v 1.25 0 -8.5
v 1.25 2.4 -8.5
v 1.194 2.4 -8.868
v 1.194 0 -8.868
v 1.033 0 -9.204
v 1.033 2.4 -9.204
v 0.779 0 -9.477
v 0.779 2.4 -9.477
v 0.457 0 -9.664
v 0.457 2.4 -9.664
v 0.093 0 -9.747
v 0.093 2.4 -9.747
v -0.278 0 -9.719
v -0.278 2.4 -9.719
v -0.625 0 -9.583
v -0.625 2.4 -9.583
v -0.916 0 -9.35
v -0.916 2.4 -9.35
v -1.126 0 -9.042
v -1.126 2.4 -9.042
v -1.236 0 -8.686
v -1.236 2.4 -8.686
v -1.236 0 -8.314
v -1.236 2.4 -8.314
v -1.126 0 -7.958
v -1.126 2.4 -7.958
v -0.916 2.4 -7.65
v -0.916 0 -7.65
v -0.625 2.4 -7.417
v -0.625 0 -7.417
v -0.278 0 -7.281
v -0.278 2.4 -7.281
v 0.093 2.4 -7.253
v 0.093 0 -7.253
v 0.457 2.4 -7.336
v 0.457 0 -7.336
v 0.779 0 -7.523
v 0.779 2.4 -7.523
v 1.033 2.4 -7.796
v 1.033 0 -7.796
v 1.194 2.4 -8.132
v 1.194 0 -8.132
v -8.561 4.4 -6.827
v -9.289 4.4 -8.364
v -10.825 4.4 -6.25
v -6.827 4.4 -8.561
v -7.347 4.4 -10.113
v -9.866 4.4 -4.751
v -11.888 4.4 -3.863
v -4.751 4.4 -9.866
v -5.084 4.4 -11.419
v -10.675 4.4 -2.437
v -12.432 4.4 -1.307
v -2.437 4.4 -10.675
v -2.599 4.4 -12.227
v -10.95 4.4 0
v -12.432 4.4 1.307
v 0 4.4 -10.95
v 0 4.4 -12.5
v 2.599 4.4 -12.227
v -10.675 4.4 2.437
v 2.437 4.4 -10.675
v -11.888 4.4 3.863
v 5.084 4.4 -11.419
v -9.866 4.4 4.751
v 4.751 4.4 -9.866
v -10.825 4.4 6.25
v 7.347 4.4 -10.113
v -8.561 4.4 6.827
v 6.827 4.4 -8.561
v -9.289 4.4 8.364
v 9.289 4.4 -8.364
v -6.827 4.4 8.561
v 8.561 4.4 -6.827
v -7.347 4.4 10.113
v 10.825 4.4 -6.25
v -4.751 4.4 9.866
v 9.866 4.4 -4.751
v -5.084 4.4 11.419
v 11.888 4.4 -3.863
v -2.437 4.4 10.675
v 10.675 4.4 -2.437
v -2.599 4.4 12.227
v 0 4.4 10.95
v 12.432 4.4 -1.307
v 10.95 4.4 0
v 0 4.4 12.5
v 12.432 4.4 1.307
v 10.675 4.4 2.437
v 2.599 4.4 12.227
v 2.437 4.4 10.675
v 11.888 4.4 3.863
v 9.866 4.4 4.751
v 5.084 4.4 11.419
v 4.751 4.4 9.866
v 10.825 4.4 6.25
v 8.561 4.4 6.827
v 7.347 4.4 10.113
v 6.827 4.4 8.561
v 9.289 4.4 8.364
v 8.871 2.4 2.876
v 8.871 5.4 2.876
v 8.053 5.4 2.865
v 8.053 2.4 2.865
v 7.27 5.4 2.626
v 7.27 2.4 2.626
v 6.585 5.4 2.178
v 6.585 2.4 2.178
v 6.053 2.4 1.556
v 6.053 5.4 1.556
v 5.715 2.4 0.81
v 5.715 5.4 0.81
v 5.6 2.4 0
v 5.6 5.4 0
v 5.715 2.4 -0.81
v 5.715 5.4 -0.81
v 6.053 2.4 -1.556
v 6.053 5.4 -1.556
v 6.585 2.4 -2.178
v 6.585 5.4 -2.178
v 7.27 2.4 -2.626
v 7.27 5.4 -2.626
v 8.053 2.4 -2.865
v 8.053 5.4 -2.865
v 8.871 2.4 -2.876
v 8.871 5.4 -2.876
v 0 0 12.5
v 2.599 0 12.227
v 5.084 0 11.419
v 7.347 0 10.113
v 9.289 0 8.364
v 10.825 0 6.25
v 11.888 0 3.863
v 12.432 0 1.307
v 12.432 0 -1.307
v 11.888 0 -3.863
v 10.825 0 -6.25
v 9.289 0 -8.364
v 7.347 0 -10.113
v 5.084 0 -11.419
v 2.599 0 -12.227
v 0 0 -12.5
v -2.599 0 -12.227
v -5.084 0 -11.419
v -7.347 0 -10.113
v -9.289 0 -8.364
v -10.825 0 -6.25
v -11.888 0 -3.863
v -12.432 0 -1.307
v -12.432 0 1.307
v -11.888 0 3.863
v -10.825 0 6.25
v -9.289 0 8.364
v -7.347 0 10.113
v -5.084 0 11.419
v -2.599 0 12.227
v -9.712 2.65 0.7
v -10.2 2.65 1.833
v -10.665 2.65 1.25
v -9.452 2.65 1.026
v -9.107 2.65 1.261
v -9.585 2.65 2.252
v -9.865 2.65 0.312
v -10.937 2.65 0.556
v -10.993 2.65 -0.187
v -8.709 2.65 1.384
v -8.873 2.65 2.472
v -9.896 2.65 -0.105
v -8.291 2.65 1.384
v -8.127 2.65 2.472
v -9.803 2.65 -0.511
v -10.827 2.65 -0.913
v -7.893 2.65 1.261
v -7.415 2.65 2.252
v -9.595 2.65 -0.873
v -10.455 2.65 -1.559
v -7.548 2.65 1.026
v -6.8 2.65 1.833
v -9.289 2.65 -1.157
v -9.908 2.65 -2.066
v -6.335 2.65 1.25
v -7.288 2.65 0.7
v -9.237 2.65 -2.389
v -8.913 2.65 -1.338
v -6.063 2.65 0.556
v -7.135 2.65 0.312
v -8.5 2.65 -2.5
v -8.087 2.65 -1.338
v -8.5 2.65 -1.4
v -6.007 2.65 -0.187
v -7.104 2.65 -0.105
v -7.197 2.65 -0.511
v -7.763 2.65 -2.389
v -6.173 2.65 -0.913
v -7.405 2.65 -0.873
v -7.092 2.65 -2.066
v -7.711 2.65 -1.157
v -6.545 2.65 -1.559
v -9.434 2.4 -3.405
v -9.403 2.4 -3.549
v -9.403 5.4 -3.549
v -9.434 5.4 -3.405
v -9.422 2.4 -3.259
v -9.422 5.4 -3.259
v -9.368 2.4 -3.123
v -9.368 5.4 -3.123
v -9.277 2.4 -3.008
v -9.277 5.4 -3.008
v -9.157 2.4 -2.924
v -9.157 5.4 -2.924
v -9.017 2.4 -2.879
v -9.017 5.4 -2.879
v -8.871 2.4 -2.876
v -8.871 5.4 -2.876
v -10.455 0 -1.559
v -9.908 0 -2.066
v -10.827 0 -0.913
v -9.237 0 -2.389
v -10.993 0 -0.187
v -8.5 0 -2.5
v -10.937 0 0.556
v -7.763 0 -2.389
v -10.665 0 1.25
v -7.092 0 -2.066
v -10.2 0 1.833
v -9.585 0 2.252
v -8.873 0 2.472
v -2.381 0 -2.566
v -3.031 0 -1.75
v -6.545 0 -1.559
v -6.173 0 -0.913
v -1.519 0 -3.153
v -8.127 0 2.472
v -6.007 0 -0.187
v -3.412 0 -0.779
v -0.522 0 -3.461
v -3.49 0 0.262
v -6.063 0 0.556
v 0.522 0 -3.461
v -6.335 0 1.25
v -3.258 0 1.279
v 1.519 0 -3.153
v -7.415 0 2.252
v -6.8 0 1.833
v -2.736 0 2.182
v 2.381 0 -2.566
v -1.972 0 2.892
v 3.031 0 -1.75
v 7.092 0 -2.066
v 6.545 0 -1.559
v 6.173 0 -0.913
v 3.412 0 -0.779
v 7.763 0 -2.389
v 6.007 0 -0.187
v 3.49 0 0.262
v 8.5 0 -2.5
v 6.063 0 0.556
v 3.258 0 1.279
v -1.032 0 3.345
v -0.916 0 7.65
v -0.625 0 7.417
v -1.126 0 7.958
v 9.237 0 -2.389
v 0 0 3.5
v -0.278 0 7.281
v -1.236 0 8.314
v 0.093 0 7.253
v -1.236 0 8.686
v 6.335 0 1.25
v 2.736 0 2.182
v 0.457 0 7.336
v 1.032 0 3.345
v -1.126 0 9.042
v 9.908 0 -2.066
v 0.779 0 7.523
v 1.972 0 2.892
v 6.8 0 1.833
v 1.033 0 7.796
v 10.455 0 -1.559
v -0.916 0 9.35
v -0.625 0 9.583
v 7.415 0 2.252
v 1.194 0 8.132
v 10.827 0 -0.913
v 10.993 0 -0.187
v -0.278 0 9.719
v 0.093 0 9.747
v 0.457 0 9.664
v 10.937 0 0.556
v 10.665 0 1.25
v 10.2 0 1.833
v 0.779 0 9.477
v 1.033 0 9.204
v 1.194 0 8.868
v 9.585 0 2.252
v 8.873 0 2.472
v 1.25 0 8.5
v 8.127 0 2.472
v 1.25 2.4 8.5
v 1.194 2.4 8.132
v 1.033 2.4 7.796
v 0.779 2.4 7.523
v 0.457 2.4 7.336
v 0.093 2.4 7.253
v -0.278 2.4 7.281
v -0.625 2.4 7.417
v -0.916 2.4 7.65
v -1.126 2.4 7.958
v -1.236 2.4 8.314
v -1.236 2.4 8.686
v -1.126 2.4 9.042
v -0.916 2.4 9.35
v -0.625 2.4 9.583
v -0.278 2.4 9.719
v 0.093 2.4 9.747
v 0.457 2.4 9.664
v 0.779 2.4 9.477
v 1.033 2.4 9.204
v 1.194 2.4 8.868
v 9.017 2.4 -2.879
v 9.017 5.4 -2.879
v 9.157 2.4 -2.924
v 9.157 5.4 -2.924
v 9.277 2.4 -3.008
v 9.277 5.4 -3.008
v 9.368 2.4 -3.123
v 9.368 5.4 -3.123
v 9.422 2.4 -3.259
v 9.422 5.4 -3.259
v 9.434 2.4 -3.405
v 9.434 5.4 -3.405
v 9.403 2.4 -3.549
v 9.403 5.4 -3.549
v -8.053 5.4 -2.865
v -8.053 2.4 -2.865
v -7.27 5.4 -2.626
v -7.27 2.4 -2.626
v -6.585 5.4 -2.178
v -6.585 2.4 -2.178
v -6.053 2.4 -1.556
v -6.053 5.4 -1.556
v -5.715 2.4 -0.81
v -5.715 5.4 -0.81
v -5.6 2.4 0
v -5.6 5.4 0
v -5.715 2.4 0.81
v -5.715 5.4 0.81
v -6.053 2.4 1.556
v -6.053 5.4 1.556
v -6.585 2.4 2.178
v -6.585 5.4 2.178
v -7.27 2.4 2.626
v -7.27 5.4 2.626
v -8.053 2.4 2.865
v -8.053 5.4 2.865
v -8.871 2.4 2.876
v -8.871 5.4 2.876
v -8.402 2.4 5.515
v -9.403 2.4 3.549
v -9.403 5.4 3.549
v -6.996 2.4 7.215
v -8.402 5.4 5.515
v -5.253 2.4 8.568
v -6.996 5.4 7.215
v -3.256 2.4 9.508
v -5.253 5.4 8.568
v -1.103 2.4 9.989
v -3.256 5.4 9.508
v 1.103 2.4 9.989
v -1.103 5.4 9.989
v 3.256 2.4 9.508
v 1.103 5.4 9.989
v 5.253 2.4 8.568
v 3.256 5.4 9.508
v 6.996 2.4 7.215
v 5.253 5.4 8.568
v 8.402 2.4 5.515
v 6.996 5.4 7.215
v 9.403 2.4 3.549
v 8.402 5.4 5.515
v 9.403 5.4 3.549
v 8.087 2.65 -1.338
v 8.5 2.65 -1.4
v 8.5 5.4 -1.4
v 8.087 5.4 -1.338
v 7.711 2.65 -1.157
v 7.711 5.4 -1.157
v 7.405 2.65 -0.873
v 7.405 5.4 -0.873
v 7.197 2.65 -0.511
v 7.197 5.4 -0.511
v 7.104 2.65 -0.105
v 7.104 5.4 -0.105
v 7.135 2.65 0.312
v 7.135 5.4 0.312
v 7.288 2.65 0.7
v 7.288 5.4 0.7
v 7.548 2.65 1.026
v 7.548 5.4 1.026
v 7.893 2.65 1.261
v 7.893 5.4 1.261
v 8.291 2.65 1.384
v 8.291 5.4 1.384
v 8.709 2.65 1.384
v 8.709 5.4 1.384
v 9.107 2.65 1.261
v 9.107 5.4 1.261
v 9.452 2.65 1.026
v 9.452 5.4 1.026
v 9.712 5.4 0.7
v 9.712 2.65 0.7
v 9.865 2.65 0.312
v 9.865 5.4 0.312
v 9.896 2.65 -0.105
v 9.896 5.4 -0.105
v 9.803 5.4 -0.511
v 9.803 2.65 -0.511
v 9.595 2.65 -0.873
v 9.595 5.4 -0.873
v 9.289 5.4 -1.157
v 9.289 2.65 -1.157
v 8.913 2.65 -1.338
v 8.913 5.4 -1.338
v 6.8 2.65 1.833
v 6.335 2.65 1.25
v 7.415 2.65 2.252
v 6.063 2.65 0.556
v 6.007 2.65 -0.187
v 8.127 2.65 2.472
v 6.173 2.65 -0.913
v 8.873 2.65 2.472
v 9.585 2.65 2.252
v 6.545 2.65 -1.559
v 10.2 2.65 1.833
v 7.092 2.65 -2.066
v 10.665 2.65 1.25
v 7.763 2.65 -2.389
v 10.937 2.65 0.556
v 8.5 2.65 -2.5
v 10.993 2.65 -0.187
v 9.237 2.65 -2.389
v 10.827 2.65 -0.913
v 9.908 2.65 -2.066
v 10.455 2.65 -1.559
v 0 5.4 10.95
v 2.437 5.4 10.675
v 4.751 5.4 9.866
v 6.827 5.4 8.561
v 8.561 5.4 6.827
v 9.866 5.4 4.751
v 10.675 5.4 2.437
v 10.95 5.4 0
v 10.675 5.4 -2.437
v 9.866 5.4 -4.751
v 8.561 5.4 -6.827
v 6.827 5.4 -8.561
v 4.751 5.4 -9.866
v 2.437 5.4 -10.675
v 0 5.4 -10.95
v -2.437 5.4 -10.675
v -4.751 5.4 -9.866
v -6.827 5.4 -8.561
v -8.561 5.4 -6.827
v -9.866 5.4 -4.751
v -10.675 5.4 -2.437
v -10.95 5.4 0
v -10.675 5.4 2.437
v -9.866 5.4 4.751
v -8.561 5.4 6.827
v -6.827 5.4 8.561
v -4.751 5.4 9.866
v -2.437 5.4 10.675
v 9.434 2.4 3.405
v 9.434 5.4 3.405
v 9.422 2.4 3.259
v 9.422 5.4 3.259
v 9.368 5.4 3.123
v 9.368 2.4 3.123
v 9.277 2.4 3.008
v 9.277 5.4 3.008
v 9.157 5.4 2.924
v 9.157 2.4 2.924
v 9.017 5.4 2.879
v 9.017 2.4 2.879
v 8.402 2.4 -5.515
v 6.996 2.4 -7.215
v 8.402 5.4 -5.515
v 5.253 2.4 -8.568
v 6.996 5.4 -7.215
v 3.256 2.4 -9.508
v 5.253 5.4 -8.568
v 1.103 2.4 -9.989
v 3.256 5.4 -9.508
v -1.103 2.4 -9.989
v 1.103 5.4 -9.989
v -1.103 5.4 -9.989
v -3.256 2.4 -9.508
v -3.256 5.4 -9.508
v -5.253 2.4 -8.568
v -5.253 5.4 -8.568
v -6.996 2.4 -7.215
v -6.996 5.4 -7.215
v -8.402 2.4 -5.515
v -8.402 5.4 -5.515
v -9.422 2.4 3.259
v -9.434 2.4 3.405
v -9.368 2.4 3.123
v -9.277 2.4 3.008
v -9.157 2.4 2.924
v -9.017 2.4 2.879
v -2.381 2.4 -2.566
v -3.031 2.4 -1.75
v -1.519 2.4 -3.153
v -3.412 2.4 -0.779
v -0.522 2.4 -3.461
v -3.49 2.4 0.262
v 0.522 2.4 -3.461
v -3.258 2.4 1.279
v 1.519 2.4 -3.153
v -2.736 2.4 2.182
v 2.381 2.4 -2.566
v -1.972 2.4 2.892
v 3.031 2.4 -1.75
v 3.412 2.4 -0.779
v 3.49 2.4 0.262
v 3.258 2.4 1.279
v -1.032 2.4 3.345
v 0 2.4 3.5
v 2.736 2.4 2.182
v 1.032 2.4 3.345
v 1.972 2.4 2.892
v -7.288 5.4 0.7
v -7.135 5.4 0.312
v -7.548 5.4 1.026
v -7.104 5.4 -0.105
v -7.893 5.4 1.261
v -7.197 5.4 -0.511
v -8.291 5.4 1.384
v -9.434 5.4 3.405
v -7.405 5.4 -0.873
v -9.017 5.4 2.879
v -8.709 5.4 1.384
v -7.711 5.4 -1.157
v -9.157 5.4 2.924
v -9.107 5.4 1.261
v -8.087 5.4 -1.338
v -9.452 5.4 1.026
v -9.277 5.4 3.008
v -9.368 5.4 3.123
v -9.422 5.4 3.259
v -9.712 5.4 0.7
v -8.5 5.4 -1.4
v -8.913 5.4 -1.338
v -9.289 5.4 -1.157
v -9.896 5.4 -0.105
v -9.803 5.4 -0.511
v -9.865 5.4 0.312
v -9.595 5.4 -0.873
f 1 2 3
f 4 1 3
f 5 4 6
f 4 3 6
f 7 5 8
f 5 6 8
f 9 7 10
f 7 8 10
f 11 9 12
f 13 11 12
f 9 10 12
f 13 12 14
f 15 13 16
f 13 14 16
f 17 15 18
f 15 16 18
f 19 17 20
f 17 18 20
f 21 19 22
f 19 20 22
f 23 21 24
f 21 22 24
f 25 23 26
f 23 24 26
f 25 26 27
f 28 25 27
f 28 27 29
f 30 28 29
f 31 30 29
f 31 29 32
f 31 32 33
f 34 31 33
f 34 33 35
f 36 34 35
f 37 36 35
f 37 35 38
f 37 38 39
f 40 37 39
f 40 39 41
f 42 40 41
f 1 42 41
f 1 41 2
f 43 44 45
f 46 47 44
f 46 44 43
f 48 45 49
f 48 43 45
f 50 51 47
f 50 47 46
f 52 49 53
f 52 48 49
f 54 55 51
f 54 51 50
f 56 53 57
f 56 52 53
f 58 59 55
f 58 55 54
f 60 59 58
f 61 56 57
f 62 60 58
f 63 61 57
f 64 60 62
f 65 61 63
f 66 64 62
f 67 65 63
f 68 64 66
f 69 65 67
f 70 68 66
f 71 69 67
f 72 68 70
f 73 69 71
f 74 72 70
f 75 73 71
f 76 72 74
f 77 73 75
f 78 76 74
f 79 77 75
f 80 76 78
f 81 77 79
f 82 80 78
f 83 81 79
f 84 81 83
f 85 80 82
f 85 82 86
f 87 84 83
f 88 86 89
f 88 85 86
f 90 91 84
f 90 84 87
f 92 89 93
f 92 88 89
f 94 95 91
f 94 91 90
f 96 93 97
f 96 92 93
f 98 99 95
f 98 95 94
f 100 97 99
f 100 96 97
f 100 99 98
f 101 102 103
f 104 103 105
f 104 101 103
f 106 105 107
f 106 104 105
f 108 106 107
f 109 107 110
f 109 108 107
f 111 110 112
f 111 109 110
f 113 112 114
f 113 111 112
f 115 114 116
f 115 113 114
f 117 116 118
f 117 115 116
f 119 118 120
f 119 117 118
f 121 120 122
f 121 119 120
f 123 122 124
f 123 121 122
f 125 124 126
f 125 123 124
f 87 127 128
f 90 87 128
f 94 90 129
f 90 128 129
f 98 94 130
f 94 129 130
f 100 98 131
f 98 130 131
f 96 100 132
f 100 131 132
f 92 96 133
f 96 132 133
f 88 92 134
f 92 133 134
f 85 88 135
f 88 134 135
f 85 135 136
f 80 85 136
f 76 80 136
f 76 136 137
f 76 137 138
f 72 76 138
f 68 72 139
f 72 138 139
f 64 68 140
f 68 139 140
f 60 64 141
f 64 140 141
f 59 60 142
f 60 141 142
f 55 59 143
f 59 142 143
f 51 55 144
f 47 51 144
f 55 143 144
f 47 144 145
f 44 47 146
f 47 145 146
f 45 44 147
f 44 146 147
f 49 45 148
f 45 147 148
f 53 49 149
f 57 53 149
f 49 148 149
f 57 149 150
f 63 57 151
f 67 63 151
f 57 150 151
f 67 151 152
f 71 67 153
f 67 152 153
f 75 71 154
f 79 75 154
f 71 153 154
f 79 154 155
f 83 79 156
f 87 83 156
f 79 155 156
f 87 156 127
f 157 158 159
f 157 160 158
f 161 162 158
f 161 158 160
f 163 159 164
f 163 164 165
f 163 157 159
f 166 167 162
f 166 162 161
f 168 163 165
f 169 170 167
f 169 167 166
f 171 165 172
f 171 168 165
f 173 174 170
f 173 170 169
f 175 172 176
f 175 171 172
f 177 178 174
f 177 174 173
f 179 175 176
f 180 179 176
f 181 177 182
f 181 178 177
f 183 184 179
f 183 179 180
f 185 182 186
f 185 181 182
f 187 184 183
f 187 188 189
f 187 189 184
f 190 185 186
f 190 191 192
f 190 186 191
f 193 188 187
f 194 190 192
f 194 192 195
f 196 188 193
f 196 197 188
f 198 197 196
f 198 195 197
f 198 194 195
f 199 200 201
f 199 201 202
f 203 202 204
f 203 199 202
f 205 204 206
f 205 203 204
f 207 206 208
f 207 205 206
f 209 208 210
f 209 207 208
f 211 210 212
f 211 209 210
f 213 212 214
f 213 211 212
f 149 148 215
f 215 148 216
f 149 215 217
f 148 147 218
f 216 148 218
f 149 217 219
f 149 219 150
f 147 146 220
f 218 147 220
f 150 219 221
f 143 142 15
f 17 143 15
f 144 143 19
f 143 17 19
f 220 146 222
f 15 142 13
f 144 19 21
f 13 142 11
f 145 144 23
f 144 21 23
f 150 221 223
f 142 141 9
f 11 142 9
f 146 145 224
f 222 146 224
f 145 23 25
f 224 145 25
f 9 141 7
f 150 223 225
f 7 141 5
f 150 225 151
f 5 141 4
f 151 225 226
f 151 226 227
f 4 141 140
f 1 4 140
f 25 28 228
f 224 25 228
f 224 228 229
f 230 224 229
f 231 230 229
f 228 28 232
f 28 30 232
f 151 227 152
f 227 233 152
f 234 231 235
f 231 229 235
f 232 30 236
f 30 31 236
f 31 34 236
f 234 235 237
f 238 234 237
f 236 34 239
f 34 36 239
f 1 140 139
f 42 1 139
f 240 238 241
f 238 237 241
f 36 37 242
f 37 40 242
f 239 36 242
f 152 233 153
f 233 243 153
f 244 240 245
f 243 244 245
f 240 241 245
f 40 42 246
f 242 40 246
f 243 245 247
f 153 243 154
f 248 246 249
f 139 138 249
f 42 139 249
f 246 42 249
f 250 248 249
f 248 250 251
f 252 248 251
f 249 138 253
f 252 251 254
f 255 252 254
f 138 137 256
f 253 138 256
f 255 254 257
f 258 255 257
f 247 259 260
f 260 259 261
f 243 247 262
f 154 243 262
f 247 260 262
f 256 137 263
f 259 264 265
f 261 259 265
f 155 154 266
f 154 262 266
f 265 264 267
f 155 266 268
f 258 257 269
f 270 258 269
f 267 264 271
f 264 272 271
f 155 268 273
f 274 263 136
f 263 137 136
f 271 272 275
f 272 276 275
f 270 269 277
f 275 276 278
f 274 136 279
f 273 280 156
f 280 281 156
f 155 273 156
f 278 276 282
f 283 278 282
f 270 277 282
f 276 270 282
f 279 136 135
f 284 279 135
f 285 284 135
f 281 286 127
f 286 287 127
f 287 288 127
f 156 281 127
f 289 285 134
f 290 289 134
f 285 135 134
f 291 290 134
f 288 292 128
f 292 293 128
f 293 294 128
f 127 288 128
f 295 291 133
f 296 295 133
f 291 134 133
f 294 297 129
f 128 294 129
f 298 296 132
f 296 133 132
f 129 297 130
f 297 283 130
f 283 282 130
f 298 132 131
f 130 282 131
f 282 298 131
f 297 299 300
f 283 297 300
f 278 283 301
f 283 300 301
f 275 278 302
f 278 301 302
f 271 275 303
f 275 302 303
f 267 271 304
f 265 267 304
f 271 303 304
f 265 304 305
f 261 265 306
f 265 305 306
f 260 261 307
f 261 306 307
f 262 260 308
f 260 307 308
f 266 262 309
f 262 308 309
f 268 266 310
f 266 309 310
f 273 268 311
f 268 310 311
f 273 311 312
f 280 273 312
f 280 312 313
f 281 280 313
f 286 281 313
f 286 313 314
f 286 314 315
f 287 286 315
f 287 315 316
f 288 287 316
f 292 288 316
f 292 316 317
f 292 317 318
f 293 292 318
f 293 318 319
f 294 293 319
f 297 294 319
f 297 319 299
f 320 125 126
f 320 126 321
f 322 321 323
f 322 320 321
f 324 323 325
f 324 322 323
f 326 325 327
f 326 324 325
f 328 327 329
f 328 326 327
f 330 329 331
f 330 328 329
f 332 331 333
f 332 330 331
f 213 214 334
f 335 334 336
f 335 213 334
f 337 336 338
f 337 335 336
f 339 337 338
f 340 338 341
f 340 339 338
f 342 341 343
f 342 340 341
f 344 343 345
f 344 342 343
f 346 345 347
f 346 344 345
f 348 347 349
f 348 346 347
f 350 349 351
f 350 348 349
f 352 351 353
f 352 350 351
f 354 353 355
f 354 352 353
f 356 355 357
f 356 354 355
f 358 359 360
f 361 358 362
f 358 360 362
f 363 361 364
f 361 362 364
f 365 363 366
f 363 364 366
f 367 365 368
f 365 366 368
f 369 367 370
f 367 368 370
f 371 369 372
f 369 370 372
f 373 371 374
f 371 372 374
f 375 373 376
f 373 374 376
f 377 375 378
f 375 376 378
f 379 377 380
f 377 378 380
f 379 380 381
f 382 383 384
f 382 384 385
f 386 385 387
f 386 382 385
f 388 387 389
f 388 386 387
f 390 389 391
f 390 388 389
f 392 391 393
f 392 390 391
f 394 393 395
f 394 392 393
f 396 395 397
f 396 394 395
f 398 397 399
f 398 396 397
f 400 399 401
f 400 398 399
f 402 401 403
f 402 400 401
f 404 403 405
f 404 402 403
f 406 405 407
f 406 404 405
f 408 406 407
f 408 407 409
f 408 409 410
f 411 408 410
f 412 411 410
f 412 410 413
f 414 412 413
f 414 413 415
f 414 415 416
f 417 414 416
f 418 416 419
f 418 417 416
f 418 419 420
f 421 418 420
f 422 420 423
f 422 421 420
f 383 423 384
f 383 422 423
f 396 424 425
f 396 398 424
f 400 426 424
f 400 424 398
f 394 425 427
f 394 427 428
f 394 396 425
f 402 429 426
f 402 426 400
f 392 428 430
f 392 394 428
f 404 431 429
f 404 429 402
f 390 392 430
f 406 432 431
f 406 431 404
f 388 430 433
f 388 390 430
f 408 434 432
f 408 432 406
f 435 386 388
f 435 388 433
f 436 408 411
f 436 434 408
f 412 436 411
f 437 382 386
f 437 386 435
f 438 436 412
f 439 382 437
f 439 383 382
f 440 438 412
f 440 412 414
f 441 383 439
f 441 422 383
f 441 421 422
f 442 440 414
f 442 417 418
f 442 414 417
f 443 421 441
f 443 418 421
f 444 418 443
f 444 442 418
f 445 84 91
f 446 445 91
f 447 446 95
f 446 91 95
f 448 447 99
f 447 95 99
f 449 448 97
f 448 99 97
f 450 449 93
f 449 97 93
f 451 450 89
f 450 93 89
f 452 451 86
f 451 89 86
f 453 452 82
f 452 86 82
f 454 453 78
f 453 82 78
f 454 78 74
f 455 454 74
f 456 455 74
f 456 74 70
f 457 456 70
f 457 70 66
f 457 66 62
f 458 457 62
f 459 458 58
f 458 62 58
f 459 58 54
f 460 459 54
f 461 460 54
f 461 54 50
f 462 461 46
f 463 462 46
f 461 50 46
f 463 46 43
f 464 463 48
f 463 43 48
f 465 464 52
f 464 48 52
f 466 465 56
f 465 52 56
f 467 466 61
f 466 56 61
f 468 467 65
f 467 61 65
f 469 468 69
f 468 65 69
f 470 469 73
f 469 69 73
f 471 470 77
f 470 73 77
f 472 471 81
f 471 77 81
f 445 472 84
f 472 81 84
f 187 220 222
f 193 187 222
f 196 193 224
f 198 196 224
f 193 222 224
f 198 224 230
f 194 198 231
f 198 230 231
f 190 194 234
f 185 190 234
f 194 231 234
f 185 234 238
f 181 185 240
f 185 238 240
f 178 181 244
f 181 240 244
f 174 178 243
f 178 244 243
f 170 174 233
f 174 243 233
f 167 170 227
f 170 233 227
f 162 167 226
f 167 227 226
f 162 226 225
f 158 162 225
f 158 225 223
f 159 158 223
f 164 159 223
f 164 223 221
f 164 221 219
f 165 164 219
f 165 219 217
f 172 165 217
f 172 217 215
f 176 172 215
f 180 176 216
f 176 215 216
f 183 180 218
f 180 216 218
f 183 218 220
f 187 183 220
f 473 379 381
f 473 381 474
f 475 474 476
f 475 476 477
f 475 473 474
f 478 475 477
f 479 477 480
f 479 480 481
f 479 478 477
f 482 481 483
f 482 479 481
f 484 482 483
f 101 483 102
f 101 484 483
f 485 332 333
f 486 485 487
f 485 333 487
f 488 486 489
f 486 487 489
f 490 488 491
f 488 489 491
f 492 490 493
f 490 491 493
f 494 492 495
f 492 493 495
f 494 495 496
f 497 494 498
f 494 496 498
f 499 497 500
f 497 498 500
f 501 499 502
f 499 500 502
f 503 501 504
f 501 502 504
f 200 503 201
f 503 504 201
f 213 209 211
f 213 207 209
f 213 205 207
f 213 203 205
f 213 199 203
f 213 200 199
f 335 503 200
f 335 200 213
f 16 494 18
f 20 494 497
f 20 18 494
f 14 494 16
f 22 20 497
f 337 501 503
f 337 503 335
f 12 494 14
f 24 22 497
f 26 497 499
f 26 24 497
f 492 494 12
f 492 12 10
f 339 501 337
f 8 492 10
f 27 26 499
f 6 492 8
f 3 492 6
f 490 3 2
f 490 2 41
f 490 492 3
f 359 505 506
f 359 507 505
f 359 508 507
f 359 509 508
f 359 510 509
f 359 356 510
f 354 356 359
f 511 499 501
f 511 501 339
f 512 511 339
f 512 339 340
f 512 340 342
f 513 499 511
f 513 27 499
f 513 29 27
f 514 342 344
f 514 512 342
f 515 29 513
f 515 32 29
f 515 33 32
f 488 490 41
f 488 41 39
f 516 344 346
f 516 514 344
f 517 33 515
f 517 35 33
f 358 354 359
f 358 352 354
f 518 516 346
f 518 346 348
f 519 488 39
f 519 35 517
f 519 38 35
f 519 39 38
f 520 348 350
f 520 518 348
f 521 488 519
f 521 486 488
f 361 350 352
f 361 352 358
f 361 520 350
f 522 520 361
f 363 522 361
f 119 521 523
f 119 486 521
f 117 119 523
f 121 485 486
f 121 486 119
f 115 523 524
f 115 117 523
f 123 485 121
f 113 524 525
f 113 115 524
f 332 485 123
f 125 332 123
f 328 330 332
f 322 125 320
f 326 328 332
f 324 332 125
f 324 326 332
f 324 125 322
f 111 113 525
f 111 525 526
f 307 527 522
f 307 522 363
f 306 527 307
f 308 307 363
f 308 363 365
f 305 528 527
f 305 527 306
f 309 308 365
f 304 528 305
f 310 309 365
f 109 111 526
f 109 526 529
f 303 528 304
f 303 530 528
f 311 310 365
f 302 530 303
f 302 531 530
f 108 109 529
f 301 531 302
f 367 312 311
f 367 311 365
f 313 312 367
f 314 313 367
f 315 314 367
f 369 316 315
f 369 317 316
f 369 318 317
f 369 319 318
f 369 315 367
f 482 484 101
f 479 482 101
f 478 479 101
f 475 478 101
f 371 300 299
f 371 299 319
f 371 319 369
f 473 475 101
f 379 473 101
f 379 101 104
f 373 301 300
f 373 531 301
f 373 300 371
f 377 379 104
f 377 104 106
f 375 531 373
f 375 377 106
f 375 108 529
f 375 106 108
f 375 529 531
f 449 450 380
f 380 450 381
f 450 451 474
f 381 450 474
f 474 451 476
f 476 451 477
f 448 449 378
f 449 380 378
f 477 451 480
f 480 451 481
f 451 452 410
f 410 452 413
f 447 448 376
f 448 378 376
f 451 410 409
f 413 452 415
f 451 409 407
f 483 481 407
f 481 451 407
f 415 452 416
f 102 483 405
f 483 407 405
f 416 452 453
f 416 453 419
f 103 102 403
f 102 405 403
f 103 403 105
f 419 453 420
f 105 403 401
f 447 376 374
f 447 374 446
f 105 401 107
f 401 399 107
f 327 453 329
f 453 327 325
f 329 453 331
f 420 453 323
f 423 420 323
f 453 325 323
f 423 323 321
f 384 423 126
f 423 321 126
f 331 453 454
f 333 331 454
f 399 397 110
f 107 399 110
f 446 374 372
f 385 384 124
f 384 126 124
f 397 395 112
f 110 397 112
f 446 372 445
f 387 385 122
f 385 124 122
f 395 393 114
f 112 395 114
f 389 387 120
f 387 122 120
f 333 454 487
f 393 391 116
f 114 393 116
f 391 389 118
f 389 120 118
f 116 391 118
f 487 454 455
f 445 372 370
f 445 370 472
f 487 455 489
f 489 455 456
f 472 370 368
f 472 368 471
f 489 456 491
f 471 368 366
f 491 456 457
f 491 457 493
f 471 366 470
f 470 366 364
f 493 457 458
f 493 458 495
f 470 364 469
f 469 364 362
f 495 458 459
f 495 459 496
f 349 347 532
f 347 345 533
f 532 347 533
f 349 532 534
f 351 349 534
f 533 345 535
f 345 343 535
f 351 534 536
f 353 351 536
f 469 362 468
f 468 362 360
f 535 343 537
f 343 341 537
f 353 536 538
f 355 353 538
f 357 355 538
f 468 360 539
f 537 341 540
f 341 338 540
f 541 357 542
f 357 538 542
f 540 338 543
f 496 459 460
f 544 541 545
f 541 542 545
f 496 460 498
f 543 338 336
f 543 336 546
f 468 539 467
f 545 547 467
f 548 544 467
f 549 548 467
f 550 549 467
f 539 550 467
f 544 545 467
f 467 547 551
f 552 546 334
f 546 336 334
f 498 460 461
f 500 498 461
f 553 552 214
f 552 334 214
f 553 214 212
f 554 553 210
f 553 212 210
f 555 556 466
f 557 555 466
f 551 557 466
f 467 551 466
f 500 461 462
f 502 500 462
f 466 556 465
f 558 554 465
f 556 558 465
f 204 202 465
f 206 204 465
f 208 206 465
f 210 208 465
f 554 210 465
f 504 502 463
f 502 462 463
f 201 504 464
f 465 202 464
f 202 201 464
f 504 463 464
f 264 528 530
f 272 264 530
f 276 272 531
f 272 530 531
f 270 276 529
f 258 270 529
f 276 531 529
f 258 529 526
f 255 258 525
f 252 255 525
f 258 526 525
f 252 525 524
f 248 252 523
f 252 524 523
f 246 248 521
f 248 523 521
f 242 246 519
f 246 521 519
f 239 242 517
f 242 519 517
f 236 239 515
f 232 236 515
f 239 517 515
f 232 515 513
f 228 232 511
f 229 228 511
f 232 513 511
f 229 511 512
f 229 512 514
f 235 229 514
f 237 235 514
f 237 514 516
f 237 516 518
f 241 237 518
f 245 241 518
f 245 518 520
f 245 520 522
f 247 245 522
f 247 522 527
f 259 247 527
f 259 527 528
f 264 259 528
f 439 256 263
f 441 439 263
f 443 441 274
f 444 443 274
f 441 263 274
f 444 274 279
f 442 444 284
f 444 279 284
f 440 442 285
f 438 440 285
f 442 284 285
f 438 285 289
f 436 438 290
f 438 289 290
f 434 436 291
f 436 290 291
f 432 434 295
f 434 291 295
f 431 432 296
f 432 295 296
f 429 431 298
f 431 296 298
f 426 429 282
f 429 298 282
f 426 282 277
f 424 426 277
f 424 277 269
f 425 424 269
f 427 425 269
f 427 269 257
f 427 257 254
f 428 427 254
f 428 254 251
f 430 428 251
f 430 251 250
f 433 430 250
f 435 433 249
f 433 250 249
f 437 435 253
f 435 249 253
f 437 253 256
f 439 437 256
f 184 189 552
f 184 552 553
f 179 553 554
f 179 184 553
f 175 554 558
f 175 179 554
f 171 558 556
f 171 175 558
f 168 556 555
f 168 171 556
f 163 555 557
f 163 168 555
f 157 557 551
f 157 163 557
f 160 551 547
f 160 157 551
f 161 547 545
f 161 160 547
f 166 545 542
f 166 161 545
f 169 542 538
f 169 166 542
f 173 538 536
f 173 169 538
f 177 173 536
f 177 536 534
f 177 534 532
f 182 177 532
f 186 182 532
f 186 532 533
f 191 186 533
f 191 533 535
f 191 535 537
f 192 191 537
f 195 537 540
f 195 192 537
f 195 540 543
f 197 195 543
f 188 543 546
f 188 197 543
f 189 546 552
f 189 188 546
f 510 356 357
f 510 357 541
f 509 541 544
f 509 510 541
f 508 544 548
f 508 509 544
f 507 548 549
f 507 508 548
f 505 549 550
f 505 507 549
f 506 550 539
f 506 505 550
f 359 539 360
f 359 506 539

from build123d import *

# Parameters (mm, degrees)
SKETCH1_R             = 12.5
BOSS_EXTRUDE1_DEPTH   = 4.4
SKETCH2_R             = 10.95
BOSS_EXTRUDE2_DEPTH   = 1
SKETCH3_R             = 10.05
CUT_EXTRUDE1_DEPTH    = 3
SKETCH4_R             = 3.5
CUT_EXTRUDE2_DEPTH    = 18.930421077
SKETCH5_R             = 1.4
CUT_EXTRUDE3_DEPTH    = 19.484047176
SKETCH6_R             = 1.4
BOSS_EXTRUDE3_DEPTH   = 3
FILLET1_R             = 0.5
SKETCH7_R             = 2.5
CUT_EXTRUDE4_DEPTH    = 2.65
M3X0_5_TAPPED_HOLE1_D = 2.5


with BuildPart() as part:
    # Sketch1 → Boss-Extrude1 (new body)
    with BuildSketch(Plane(origin=(0, 0, 0), x_dir=(1, 0, 0), z_dir=(0, 1, 0))):
        with Locations(Location((0, 0, 0), (0, 0, 270))):
            Circle(SKETCH1_R)
    extrude(amount=BOSS_EXTRUDE1_DEPTH)

    # Sketch2 → Boss-Extrude2 (add)
    with BuildSketch(Plane(origin=(0, 4.4, 0), x_dir=(1, 0, 0), z_dir=(0, 1, 0))):
        with Locations(Location((0, 0, 0), (0, 0, 270))):
            Circle(SKETCH2_R)
    extrude(amount=BOSS_EXTRUDE2_DEPTH)

    # Sketch3 → Cut-Extrude1 (cut)
    with BuildSketch(Plane(origin=(0, 5.4, 0), x_dir=(1, 0, 0), z_dir=(0, 1, 0))):
        with Locations(Location((0, 0, 0), (0, 0, 270))):
            Circle(SKETCH3_R)
    extrude(amount=-CUT_EXTRUDE1_DEPTH, mode=Mode.SUBTRACT)

    # Sketch4 → Cut-Extrude2 (cut, through all)
    with BuildSketch(Plane(origin=(0, 2.4, 0), x_dir=(1, 0, 0), z_dir=(0, 1, 0))):
        with Locations(Location((0, 0, 0), (0, 0, 270))):
            Circle(SKETCH4_R)
    extrude(amount=-CUT_EXTRUDE2_DEPTH, mode=Mode.SUBTRACT)

    # Sketch5 → Cut-Extrude3 (cut, through all)
    with BuildSketch(Plane.XZ):
        with Locations(Location((-8.5, 0, 0), (0, 0, 270))):
            Circle(SKETCH5_R)
        with Locations(Location((8.5, 0, 0), (0, 0, 270))):
            Circle(SKETCH5_R)
    extrude(amount=-CUT_EXTRUDE3_DEPTH, mode=Mode.SUBTRACT)

    # Sketch6 → Boss-Extrude3 (add)
    # profile 1 of 2: a face of its own
    with BuildSketch(Plane(origin=(0, 2.4, 0), x_dir=(1, 0, 0), z_dir=(0, 1, 0))):
        with BuildLine():
            ThreePointArc((-9.696617647, 2.641610533), (-5.6, 0), (-9.696617647, -2.641610533))
            ThreePointArc((-9.696617647, -2.641610533), (-10.05, 0), (-9.696617647, 2.641610533))
        make_face()
        with Locations(Location((-8.5, 0, 0), (0, 0, 90))):
            Circle(SKETCH6_R, mode=Mode.SUBTRACT)
    # profile 2 of 2: a face of its own
    with BuildSketch(Plane(origin=(0, 2.4, 0), x_dir=(1, 0, 0), z_dir=(0, 1, 0))):
        with BuildLine():
            ThreePointArc((9.696617647, -2.641610533), (5.6, 0), (9.696617647, 2.641610533))
            ThreePointArc((9.696617647, 2.641610533), (10.05, 0), (9.696617647, -2.641610533))
        make_face()
        with Locations(Location((8.5, 0, 0), (0, 0, 90))):
            Circle(SKETCH6_R, mode=Mode.SUBTRACT)
    extrude(amount=BOSS_EXTRUDE3_DEPTH)

    # Fillet1
    # the kernel refuses this fillet: 0.5 mm, written as the material it adds along each edge
    with BuildSketch(Plane(origin=(-9.696617647, 0.016337815, 2.641610533), x_dir=(0.30831902274011397, 0, 0.9512830179376593), z_dir=(0, 1, 0)), Plane(origin=(9.696617647, 0.016337815, -2.641610533), x_dir=(-0.30831902274011413, 0, -0.9512830179376593), z_dir=(0, 1, 0))) as fillet1_piece_1:
        with BuildLine():
            CenterArc((0.929746842, 0.499437138), FILLET1_R, 154.693905627, 118.025000924)
            ThreePointArc((0.477728298, 0.713164151), (0.265396902, 0.338808542), (0, 0))
            ThreePointArc((0, 0), (0.476732437, -0.011313523), (0.953464874, 0))
        make_face()
    extrude(amount=5.383662185)
    with BuildSketch(Plane(origin=(-9.696617647, 0.016337815, -2.641610533), x_dir=(0.9619368896352812, 0, -0.2732716969589074), z_dir=(0, 1, 0)), Plane(origin=(9.696617647, 0.016337815, 2.641610533), x_dir=(-0.9619368896352809, 0, 0.2732716969589082), z_dir=(0, 1, 0))) as fillet1_piece_2:
        with BuildLine():
            CenterArc((0.932385368, 0.494493854), FILLET1_R, 143.464092257, 118.025000924)
            ThreePointArc((0.530643407, 0.792157081), (0.255922209, 0.402374993), (0, 0))
            ThreePointArc((0, 0), (0.429193265, 0.031935645), (0.858386529, 0))
        make_face()
    extrude(amount=5.383662185)

    # Sketch7 → Cut-Extrude4 (cut)
    with BuildSketch(Plane.XZ):
        with Locations(Location((-8.5, 0, 0), (0, 0, 270))):
            Circle(SKETCH7_R)
        with Locations(Location((8.5, 0, 0), (0, 0, 270))):
            Circle(SKETCH7_R)
    extrude(amount=-CUT_EXTRUDE4_DEPTH, mode=Mode.SUBTRACT)

    # M3x0.5 Tapped Hole1 (through all)
    with Locations(Plane(origin=(0, 0, 0), x_dir=(-1, 0, 0), z_dir=(0, -1, 0))):
        with Locations((0, 8.5), (0, -8.5)):
            Hole(M3X0_5_TAPPED_HOLE1_D / 2)


solid = part.part
